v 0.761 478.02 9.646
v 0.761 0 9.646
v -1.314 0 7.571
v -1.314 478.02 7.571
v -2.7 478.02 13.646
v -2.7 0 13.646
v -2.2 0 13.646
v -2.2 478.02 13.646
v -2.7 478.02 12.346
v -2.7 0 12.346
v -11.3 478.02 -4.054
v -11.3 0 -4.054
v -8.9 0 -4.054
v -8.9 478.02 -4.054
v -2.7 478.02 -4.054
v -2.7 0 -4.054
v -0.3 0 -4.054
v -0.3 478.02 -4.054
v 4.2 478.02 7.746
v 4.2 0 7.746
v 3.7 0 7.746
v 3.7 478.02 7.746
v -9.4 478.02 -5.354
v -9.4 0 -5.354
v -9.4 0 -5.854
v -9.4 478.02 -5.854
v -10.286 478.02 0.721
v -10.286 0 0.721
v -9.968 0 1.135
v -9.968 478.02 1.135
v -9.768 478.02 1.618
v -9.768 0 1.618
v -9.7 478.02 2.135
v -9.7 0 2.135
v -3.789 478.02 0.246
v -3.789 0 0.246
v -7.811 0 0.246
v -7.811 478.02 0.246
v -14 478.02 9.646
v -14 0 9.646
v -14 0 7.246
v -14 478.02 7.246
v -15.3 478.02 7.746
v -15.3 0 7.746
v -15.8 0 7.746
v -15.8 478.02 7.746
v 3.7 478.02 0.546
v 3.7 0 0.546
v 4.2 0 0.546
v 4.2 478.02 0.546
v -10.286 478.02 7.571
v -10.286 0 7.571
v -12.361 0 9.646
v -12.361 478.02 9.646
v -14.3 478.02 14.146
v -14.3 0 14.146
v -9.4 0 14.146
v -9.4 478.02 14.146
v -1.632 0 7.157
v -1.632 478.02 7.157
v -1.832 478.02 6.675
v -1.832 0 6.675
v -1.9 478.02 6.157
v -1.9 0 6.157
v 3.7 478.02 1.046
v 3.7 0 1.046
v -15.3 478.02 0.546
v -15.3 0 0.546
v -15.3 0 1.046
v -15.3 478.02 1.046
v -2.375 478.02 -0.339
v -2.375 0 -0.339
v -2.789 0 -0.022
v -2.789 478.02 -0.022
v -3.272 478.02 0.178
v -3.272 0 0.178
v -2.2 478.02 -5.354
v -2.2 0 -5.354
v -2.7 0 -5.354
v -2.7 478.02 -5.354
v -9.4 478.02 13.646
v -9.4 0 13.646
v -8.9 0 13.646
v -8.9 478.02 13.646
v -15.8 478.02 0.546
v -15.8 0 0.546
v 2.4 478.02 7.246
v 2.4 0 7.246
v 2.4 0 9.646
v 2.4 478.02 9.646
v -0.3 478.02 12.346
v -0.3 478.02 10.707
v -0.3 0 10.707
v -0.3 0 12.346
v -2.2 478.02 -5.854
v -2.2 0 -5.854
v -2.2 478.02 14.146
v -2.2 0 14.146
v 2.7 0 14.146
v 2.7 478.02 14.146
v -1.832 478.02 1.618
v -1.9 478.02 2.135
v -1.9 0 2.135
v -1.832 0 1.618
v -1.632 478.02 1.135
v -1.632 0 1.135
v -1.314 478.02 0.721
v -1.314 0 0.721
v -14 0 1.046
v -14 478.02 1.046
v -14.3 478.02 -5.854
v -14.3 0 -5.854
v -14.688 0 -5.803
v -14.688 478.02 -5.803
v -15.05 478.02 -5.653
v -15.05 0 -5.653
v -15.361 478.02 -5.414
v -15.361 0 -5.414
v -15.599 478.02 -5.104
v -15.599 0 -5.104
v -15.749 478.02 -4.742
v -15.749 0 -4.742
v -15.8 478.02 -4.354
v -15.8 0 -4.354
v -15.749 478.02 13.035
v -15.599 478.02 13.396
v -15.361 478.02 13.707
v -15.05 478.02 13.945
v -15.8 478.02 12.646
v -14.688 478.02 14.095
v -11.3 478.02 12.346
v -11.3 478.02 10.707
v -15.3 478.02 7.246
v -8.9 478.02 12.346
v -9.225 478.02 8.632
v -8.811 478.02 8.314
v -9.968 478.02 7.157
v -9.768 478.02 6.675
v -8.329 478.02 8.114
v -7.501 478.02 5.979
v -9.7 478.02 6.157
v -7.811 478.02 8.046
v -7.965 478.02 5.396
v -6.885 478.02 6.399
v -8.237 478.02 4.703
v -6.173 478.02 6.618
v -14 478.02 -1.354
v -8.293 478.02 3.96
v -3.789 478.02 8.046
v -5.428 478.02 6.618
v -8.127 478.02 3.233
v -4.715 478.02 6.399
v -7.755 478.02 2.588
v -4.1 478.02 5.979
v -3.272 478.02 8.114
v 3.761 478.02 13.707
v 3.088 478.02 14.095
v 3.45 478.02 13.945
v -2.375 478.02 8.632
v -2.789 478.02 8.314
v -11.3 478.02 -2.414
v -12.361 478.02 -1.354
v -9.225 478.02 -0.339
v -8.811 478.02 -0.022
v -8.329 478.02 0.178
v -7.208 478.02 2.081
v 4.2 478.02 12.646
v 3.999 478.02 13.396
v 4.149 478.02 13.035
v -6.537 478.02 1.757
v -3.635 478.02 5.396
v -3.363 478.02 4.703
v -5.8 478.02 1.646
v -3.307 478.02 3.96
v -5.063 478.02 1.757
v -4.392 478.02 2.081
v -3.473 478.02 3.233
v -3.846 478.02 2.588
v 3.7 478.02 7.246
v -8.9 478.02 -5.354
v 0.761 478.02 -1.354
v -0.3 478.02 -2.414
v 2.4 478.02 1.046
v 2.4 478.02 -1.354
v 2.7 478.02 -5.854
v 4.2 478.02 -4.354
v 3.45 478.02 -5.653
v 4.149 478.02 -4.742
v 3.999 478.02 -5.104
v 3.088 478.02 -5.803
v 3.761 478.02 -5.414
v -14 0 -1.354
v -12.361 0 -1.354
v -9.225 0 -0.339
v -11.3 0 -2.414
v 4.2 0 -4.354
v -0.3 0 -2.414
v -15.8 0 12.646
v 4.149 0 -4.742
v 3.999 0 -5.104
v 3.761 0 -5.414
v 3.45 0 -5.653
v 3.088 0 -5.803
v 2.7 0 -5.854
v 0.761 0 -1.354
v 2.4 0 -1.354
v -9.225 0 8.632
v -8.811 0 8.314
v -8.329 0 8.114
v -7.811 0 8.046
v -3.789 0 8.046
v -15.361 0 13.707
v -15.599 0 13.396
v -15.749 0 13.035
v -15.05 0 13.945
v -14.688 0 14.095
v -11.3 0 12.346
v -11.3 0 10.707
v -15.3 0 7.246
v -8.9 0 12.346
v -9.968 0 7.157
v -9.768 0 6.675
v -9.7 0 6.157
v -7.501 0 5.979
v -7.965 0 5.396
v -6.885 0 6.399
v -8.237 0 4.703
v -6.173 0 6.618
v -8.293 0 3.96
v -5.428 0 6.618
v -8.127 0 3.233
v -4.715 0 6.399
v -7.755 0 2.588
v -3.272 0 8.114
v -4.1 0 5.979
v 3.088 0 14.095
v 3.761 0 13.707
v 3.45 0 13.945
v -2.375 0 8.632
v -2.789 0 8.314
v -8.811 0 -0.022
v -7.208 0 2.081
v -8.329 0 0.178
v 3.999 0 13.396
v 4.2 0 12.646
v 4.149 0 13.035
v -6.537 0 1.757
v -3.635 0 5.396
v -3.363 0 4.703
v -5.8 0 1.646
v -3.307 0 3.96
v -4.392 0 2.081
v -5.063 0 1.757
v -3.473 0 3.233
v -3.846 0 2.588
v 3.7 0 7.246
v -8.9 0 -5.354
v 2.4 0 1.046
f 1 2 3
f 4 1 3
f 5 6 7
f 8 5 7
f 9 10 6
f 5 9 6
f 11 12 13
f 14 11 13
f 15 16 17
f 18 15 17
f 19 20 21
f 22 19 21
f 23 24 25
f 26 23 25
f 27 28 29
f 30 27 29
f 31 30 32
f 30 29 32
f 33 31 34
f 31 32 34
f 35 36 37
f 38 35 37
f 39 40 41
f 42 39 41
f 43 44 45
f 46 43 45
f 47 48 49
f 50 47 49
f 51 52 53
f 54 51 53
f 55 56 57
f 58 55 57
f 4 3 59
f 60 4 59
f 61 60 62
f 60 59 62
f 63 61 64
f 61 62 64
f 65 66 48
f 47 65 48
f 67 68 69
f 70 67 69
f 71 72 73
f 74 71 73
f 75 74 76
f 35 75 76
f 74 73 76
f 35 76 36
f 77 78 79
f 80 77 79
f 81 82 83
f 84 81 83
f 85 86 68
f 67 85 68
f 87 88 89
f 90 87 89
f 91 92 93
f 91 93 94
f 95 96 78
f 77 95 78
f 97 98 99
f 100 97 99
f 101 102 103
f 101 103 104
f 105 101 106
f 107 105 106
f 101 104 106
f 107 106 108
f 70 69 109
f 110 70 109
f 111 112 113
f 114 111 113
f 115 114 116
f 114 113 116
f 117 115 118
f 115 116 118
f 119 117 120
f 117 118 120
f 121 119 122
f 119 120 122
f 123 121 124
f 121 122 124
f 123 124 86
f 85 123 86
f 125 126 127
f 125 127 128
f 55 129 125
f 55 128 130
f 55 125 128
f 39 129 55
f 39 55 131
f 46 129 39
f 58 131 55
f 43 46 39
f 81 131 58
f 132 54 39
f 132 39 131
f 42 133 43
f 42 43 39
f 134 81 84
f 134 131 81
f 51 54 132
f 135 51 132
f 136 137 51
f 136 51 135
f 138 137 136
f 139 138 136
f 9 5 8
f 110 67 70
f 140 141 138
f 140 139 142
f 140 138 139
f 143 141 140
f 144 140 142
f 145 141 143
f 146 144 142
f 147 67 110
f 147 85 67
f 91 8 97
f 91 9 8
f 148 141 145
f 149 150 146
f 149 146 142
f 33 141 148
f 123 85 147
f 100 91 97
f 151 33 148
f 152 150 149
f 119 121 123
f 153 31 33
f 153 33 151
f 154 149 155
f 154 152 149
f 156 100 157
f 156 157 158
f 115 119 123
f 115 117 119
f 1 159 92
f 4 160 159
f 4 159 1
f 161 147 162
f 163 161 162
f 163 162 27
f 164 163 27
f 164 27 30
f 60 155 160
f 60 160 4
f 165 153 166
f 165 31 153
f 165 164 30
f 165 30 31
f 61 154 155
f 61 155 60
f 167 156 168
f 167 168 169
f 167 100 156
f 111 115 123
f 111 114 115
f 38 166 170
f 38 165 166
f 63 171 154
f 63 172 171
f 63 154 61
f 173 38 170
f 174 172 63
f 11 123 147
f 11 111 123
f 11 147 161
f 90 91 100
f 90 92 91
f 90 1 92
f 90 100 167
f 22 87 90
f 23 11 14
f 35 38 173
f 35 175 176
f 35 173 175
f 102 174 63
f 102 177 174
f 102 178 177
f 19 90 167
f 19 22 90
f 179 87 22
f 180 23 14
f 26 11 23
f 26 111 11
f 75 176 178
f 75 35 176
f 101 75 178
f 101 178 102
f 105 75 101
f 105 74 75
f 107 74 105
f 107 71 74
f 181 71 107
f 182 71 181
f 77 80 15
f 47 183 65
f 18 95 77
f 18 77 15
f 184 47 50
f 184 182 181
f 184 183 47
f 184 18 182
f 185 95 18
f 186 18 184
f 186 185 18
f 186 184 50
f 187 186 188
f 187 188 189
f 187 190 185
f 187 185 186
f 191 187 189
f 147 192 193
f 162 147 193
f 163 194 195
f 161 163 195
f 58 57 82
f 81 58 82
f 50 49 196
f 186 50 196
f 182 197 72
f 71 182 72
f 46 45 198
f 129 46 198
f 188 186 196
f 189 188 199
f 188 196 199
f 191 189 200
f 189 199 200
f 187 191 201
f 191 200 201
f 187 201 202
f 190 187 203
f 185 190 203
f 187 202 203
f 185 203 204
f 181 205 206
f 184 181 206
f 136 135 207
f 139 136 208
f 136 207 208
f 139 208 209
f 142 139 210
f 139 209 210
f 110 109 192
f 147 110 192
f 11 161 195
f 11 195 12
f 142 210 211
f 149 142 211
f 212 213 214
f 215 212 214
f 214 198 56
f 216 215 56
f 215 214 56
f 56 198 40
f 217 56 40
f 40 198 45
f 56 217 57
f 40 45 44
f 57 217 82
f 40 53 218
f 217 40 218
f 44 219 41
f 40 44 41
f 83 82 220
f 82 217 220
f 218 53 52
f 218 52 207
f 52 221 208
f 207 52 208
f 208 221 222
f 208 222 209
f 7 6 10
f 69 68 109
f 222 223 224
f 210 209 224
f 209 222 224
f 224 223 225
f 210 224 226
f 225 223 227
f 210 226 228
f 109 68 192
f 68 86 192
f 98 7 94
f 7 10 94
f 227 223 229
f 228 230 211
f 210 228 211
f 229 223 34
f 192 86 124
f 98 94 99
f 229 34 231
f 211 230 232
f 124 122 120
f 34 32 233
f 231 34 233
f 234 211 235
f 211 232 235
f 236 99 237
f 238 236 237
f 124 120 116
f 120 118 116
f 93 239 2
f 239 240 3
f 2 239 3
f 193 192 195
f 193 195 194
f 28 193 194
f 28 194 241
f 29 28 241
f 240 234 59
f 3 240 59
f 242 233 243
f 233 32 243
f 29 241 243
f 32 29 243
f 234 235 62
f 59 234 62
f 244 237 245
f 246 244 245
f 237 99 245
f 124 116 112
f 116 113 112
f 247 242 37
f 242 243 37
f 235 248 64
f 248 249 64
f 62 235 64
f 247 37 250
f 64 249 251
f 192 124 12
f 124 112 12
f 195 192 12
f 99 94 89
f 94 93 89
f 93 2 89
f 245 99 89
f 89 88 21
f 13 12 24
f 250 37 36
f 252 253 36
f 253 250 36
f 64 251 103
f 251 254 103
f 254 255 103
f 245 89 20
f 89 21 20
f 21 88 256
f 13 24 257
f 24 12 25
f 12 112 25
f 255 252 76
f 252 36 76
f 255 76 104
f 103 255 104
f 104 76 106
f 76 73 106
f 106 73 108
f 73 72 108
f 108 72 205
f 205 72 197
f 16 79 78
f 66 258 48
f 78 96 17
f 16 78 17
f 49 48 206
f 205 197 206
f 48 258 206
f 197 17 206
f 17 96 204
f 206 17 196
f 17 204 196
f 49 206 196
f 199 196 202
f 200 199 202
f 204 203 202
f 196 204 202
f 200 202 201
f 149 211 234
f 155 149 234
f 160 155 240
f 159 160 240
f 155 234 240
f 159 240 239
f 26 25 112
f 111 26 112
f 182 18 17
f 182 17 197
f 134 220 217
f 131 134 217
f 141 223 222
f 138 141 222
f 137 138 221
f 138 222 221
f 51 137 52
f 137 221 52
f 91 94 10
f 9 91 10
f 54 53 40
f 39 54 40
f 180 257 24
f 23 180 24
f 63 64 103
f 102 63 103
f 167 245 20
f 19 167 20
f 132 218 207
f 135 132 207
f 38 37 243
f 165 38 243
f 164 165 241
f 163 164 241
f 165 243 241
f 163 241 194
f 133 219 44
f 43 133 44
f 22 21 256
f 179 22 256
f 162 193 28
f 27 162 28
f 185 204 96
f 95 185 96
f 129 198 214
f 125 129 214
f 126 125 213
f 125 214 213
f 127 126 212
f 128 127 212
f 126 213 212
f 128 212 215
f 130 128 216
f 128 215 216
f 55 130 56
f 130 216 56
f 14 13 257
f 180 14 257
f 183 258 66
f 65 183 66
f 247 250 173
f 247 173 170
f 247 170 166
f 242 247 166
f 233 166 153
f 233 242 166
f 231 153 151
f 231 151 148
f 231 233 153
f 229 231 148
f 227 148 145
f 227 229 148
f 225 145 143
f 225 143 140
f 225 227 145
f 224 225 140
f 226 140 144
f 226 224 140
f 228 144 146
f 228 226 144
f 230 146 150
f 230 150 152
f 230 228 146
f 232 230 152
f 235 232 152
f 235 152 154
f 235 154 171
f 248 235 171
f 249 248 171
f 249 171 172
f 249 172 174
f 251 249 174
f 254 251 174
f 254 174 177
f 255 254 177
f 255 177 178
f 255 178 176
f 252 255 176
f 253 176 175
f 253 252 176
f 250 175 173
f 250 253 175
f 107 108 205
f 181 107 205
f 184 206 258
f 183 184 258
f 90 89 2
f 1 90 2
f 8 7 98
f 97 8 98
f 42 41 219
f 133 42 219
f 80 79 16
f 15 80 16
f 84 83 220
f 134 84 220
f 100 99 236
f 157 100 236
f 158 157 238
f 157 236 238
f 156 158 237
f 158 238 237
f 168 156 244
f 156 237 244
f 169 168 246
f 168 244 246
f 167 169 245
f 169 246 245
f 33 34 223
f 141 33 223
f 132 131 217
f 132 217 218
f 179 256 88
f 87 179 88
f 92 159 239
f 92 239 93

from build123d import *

# Parameters (mm, degrees)
SKETCH1_R           = 2.5
BOSS_EXTRUDE1_DEPTH = 478.02


with BuildPart() as part:
    # Sketch1 → Boss-Extrude1 (new body)
    with BuildSketch(Plane(origin=(0, 0, 0), x_dir=(1, 0, 0), z_dir=(0, 1, 0))):
        with BuildLine():
            Line((-14.000129172, -7.246328066), (-15.300129172, -7.246328066))
            Line((-15.300129172, -7.246328066), (-15.300129172, -7.746328066))
            Line((-15.300129172, -7.746328066), (-15.800129172, -7.746328066))
            Line((-15.800129172, -7.746328066), (-15.800129172, -12.646328066))
            ThreePointArc((-15.800129172, -12.646328066), (-15.360789344, -13.706988238), (-14.300129172, -14.146328066))
            Line((-14.300129172, -14.146328066), (-9.400129172, -14.146328066))
            Line((-9.400129172, -14.146328066), (-9.400129172, -13.646328066))
            Line((-9.400129172, -13.646328066), (-8.900129172, -13.646328066))
            Line((-8.900129172, -13.646328066), (-8.900129172, -12.346328066))
            Line((-8.900129172, -12.346328066), (-11.300129172, -12.346328066))
            Line((-11.300129172, -12.346328066), (-11.300129172, -10.706988238))
            Line((-11.300129172, -10.706988238), (-9.225255438, -8.632114504))
            ThreePointArc((-9.225255438, -8.632114504), (-8.576408741, -8.198569001), (-7.811041876, -8.046328066))
            Line((-7.811041876, -8.046328066), (-3.789216469, -8.046328066))
            ThreePointArc((-3.789216469, -8.046328066), (-3.023849604, -8.198569001), (-2.375002907, -8.632114504))
            Line((-2.375002907, -8.632114504), (-0.300129172, -10.706988238))
            Line((-0.300129172, -10.706988238), (-0.300129172, -12.346328066))
            Line((-0.300129172, -12.346328066), (-2.700129172, -12.346328066))
            Line((-2.700129172, -12.346328066), (-2.700129172, -13.646328066))
            Line((-2.700129172, -13.646328066), (-2.200129172, -13.646328066))
            Line((-2.200129172, -13.646328066), (-2.200129172, -14.146328066))
            Line((-2.200129172, -14.146328066), (2.699870828, -14.146328066))
            ThreePointArc((2.699870828, -14.146328066), (3.760530999, -13.706988238), (4.199870828, -12.646328066))
            Line((4.199870828, -12.646328066), (4.199870828, -7.746328066))
            Line((4.199870828, -7.746328066), (3.699870828, -7.746328066))
            Line((3.699870828, -7.746328066), (3.699870828, -7.246328066))
            Line((3.699870828, -7.246328066), (2.399870828, -7.246328066))
            Line((2.399870828, -7.246328066), (2.399870828, -9.646328066))
            Line((2.399870828, -9.646328066), (0.760530999, -9.646328066))
            Line((0.760530999, -9.646328066), (-1.314342735, -7.571454332))
            ThreePointArc((-1.314342735, -7.571454332), (-1.747888237, -6.922607634), (-1.900129172, -6.15724077))
            Line((-1.900129172, -6.15724077), (-1.900129172, -2.135415363))
            ThreePointArc((-1.900129172, -2.135415363), (-1.747888237, -1.370048498), (-1.314342735, -0.7212018))
            Line((-1.314342735, -0.7212018), (0.760530999, 1.353671934))
            Line((0.760530999, 1.353671934), (2.399870828, 1.353671934))
            Line((2.399870828, 1.353671934), (2.399870828, -1.046328066))
            Line((2.399870828, -1.046328066), (3.699870828, -1.046328066))
            Line((3.699870828, -1.046328066), (3.699870828, -0.546328066))
            Line((3.699870828, -0.546328066), (4.199870828, -0.546328066))
            Line((4.199870828, -0.546328066), (4.199870828, 4.353671934))
            ThreePointArc((4.199870828, 4.353671934), (3.760530999, 5.414332106), (2.699870828, 5.853671934))
            Line((2.699870828, 5.853671934), (-2.200129172, 5.853671934))
            Line((-2.200129172, 5.853671934), (-2.200129172, 5.353671934))
            Line((-2.200129172, 5.353671934), (-2.700129172, 5.353671934))
            Line((-2.700129172, 5.353671934), (-2.700129172, 4.053671934))
            Line((-2.700129172, 4.053671934), (-0.300129172, 4.053671934))
            Line((-0.300129172, 4.053671934), (-0.300129172, 2.414332106))
            Line((-0.300129172, 2.414332106), (-2.375002907, 0.339458372))
            ThreePointArc((-2.375002907, 0.339458372), (-3.023849604, -0.094087131), (-3.789216469, -0.246328066))
            Line((-3.789216469, -0.246328066), (-7.811041876, -0.246328066))
            ThreePointArc((-7.811041876, -0.246328066), (-8.576408741, -0.094087131), (-9.225255438, 0.339458372))
            Line((-9.225255438, 0.339458372), (-11.300129172, 2.414332106))
            Line((-11.300129172, 2.414332106), (-11.300129172, 4.053671934))
            Line((-11.300129172, 4.053671934), (-8.900129172, 4.053671934))
            Line((-8.900129172, 4.053671934), (-8.900129172, 5.353671934))
            Line((-8.900129172, 5.353671934), (-9.400129172, 5.353671934))
            Line((-9.400129172, 5.353671934), (-9.400129172, 5.853671934))
            Line((-9.400129172, 5.853671934), (-14.300129172, 5.853671934))
            ThreePointArc((-14.300129172, 5.853671934), (-15.360789344, 5.414332106), (-15.800129172, 4.353671934))
            Line((-15.800129172, 4.353671934), (-15.800129172, -0.546328066))
            Line((-15.800129172, -0.546328066), (-15.300129172, -0.546328066))
            Line((-15.300129172, -0.546328066), (-15.300129172, -1.046328066))
            Line((-15.300129172, -1.046328066), (-14.000129172, -1.046328066))
            Line((-14.000129172, -1.046328066), (-14.000129172, 1.353671934))
            Line((-14.000129172, 1.353671934), (-12.360789344, 1.353671934))
            Line((-12.360789344, 1.353671934), (-10.28591561, -0.7212018))
            ThreePointArc((-10.28591561, -0.7212018), (-9.852370107, -1.370048498), (-9.700129172, -2.135415363))
            Line((-9.700129172, -2.135415363), (-9.700129172, -6.15724077))
            ThreePointArc((-9.700129172, -6.15724077), (-9.852370107, -6.922607634), (-10.28591561, -7.571454332))
            Line((-10.28591561, -7.571454332), (-12.360789344, -9.646328066))
            Line((-12.360789344, -9.646328066), (-14.000129172, -9.646328066))
            Line((-14.000129172, -9.646328066), (-14.000129172, -7.246328066))
        make_face()
        with Locations(Location((-5.800129172, -4.146328066, 0), (0, 0, 90))):
            Circle(SKETCH1_R, mode=Mode.SUBTRACT)
    extrude(amount=BOSS_EXTRUDE1_DEPTH)


solid = part.part
